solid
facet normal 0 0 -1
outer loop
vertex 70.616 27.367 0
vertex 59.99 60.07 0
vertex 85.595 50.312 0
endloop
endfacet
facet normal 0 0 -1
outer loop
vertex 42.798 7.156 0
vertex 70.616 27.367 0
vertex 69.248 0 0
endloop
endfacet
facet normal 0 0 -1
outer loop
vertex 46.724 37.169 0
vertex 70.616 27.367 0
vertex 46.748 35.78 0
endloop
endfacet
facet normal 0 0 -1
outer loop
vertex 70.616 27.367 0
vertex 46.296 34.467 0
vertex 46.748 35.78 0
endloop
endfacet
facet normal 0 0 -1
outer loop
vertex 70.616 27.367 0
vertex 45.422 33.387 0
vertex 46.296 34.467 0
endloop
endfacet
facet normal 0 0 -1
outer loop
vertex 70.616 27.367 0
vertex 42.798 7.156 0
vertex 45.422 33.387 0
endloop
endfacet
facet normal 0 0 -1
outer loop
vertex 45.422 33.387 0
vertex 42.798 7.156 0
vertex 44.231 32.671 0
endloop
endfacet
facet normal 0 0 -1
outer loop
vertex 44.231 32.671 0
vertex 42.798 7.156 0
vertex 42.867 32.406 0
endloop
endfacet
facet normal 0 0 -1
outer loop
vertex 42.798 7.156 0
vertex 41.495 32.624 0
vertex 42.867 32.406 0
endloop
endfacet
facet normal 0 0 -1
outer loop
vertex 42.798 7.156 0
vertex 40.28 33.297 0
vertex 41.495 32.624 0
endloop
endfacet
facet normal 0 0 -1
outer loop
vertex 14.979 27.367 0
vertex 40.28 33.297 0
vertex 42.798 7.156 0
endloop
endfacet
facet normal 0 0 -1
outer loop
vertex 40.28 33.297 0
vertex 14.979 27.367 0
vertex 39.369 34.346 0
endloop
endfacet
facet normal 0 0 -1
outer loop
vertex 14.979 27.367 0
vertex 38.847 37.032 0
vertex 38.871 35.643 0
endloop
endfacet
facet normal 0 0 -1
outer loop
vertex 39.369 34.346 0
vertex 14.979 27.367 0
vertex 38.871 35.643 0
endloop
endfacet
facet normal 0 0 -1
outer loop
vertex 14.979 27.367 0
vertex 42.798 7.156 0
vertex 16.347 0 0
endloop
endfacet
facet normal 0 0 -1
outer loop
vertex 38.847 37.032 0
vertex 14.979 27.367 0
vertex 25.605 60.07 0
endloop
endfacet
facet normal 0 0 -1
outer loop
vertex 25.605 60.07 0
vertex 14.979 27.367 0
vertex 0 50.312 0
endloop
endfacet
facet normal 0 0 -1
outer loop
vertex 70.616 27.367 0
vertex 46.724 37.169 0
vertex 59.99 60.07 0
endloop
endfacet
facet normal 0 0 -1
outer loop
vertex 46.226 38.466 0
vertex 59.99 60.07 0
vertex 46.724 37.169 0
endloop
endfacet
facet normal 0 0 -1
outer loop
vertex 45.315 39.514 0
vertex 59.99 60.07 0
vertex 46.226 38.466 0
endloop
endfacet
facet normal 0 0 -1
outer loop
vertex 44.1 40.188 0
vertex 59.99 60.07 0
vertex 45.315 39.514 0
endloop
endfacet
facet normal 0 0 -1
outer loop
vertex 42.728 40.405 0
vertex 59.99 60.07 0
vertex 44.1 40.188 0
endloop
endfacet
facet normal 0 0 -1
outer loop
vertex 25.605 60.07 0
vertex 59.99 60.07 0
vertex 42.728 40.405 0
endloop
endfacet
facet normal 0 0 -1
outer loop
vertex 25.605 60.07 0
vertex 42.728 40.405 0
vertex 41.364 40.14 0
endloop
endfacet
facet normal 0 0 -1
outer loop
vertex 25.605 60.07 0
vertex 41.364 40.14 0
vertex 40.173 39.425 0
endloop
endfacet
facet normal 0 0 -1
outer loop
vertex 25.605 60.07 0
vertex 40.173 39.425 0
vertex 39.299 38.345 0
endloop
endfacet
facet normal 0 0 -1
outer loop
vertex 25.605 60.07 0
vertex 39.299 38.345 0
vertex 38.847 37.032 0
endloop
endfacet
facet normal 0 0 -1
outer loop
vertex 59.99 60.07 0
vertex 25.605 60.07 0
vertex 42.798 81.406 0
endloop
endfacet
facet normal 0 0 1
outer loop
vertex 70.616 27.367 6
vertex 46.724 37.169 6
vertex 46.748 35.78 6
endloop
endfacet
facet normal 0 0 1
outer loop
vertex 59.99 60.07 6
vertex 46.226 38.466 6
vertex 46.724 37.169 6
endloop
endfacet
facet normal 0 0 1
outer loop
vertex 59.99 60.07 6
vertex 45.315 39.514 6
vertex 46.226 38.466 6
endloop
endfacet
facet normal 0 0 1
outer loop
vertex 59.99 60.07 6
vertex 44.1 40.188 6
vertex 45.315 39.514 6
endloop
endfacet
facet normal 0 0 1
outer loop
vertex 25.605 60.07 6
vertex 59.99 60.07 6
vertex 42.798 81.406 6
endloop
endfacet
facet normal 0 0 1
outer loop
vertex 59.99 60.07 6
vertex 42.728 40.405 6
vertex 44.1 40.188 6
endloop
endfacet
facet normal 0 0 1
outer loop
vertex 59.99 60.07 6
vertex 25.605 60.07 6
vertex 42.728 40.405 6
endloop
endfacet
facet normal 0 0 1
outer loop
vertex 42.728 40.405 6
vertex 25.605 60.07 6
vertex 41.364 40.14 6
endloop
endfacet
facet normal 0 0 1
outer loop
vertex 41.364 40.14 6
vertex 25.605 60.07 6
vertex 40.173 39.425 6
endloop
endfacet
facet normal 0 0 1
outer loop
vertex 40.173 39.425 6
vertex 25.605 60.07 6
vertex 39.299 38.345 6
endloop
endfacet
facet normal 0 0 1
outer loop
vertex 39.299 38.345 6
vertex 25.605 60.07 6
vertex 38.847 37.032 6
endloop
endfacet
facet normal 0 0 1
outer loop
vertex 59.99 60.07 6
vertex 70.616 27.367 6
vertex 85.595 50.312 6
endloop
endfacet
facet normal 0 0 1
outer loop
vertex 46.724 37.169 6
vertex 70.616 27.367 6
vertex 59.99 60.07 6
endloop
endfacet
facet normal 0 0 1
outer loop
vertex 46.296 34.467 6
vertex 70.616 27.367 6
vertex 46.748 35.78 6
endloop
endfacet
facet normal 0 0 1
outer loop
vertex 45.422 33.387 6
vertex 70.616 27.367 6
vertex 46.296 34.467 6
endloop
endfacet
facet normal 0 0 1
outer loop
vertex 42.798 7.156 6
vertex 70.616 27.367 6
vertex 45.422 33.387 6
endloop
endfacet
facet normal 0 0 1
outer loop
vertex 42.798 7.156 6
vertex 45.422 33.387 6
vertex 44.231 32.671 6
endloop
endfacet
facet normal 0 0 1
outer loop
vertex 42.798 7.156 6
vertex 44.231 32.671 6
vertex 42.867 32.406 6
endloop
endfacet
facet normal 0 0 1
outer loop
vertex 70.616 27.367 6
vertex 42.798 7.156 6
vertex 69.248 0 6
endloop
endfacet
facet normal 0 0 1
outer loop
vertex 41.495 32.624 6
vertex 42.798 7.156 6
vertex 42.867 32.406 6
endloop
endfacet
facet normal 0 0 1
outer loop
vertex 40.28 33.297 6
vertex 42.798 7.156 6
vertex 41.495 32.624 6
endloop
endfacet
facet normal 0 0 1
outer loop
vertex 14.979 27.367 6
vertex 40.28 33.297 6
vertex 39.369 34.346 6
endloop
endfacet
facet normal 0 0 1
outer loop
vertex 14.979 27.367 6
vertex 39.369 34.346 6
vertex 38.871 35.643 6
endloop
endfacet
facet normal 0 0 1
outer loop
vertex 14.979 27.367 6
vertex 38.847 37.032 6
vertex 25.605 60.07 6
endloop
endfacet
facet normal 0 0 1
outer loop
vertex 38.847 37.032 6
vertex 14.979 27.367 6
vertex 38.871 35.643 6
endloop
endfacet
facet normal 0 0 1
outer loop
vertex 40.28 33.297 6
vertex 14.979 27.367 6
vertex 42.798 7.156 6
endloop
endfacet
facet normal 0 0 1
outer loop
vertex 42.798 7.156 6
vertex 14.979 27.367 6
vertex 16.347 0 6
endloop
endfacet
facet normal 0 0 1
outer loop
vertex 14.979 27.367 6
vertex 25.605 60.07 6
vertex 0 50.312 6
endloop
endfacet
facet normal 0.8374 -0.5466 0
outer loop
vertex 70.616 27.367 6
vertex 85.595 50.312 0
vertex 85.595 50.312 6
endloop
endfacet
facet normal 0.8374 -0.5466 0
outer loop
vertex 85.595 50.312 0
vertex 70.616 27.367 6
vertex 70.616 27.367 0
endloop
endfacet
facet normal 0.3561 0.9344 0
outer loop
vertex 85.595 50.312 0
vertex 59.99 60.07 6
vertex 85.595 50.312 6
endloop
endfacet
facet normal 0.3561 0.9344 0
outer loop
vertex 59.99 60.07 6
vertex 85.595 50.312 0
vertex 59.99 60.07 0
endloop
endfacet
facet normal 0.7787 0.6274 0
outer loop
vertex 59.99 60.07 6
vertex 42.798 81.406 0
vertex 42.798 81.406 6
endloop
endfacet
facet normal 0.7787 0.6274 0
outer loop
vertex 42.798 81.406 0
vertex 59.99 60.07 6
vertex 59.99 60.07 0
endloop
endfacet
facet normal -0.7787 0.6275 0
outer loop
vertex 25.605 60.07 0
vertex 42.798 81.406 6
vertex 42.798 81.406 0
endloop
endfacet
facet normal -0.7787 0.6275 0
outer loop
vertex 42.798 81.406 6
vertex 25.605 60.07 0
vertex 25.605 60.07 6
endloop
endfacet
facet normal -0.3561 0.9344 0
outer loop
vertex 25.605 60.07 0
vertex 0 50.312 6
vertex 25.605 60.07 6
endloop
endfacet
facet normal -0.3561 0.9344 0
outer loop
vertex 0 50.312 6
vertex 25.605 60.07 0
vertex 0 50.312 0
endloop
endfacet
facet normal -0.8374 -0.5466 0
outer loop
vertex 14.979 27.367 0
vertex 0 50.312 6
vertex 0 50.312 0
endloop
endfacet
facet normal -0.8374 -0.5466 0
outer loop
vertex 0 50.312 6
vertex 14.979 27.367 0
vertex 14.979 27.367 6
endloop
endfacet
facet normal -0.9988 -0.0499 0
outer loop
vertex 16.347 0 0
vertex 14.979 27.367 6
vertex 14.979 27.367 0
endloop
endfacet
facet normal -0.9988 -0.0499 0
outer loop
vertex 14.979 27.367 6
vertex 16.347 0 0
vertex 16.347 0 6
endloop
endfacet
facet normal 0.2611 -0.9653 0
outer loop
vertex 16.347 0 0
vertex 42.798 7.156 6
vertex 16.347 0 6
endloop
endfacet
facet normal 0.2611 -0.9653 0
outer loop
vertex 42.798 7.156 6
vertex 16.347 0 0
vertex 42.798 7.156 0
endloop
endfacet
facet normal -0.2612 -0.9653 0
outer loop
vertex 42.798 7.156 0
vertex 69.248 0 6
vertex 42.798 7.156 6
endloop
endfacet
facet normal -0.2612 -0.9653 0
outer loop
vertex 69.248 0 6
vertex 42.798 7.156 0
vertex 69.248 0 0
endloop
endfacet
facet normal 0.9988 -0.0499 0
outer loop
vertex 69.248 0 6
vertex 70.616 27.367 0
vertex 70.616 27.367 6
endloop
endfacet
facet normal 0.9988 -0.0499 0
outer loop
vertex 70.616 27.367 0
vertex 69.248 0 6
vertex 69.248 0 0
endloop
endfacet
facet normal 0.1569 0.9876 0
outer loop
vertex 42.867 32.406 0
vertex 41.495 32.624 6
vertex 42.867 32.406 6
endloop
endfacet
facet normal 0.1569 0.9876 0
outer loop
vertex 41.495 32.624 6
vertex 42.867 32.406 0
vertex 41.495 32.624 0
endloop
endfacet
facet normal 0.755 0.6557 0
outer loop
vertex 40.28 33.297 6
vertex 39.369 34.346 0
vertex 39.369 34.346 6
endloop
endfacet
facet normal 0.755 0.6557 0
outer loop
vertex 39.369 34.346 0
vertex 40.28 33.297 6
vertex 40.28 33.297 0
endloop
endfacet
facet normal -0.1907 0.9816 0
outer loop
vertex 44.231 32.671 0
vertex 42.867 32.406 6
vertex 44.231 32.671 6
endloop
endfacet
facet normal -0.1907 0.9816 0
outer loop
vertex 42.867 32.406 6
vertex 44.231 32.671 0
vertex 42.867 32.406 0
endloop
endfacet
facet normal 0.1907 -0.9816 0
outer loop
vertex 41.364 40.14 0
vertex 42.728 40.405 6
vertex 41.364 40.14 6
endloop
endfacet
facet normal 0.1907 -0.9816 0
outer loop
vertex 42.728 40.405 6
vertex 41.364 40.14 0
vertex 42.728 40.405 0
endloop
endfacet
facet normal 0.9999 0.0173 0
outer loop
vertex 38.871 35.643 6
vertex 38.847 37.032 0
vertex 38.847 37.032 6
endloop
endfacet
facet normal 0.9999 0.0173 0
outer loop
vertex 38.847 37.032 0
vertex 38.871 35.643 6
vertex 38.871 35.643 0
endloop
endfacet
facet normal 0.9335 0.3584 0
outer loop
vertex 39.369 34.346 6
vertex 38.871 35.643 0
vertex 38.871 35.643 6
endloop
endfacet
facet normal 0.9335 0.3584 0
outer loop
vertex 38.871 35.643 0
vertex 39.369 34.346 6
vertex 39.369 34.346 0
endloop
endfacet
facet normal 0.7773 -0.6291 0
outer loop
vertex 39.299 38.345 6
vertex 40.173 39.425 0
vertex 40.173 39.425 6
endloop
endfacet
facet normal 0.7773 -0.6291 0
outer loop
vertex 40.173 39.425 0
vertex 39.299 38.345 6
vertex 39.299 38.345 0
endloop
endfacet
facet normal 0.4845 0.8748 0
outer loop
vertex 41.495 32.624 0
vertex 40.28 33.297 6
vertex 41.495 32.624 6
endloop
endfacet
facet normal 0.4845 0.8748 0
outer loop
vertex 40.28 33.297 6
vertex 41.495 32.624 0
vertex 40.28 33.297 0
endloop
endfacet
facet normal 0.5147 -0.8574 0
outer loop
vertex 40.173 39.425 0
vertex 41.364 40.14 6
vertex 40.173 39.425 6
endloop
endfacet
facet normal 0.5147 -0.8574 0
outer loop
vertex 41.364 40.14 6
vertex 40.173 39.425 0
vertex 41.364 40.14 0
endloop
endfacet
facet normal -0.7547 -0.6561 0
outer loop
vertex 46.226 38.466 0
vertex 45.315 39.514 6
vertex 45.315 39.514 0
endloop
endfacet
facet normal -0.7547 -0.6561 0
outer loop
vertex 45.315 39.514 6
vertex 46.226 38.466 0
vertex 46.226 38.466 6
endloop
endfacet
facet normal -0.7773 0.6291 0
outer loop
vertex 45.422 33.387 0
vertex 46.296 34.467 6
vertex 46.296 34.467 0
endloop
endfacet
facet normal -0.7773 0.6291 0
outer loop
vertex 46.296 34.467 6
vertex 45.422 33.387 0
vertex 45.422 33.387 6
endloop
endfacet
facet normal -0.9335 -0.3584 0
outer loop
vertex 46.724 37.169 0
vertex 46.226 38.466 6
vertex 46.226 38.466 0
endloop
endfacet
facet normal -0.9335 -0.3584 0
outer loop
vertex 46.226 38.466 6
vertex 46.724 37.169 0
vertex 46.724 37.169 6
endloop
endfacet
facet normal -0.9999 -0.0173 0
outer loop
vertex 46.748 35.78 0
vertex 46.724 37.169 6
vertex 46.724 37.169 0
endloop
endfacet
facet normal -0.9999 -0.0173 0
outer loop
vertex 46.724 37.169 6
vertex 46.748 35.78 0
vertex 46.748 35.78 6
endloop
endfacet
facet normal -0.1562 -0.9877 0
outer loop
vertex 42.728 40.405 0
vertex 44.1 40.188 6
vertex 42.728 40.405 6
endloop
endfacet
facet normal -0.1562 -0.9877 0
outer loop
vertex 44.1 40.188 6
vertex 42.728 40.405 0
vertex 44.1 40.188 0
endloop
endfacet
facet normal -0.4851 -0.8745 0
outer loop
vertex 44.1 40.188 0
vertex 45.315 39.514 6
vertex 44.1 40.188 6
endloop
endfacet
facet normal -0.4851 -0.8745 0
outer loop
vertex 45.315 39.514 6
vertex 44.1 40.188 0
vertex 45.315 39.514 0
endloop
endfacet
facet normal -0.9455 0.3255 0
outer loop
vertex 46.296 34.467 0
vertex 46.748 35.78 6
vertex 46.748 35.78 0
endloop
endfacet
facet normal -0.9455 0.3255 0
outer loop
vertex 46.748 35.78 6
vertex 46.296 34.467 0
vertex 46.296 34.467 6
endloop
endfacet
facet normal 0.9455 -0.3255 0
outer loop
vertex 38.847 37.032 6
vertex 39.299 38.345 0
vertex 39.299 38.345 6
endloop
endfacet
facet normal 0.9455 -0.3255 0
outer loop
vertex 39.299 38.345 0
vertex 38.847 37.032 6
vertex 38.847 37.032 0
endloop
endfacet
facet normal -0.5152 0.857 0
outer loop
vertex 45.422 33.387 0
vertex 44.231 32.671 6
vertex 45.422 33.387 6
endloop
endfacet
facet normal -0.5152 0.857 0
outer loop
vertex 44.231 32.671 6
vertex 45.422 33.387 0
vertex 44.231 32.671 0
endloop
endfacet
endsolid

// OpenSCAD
$fn = 32;

// ----------------------------------------------------------------------
// Star wheel: 5-point blunt, R45
// ----------------------------------------------------------------------

// --- parameters (mm) ---
n_points = 5;             // number of points / teeth
r_out = 45;               // tip radius
r_in = 29.25;             // root radius
bore_r = 4;               // centre bore radius
plate_t = 6;              // plate thickness, Z (extrusion height)
bore_d = 8;               // centre bore diameter

profile = [[42.798, 81.406], [25.605, 60.07], [0, 50.312], [14.979, 27.367], [16.347, 0], [42.798, 7.156], [69.248, 0], [70.616, 27.367], [85.595, 50.312], [59.99, 60.07]];  // primary outline, 10 points, counter clockwise
void_1 = [[46.724, 37.169], [46.226, 38.466], [45.315, 39.514], [44.1, 40.188], [42.728, 40.405], [41.364, 40.14], [40.173, 39.425], [39.299, 38.345], [38.847, 37.032], [38.871, 35.643], [39.369, 34.346], [40.28, 33.297], [41.495, 32.624], [42.867, 32.406], [44.231, 32.671], [45.422, 33.387], [46.296, 34.467], [46.748, 35.78]];  // centre bore, 18 points

// --- the one profile operation ---
difference() {
  linear_extrude(height = plate_t) polygon(points = profile);
  translate([0, 0, -1])
    linear_extrude(height = plate_t + 2) polygon(points = void_1);
}
